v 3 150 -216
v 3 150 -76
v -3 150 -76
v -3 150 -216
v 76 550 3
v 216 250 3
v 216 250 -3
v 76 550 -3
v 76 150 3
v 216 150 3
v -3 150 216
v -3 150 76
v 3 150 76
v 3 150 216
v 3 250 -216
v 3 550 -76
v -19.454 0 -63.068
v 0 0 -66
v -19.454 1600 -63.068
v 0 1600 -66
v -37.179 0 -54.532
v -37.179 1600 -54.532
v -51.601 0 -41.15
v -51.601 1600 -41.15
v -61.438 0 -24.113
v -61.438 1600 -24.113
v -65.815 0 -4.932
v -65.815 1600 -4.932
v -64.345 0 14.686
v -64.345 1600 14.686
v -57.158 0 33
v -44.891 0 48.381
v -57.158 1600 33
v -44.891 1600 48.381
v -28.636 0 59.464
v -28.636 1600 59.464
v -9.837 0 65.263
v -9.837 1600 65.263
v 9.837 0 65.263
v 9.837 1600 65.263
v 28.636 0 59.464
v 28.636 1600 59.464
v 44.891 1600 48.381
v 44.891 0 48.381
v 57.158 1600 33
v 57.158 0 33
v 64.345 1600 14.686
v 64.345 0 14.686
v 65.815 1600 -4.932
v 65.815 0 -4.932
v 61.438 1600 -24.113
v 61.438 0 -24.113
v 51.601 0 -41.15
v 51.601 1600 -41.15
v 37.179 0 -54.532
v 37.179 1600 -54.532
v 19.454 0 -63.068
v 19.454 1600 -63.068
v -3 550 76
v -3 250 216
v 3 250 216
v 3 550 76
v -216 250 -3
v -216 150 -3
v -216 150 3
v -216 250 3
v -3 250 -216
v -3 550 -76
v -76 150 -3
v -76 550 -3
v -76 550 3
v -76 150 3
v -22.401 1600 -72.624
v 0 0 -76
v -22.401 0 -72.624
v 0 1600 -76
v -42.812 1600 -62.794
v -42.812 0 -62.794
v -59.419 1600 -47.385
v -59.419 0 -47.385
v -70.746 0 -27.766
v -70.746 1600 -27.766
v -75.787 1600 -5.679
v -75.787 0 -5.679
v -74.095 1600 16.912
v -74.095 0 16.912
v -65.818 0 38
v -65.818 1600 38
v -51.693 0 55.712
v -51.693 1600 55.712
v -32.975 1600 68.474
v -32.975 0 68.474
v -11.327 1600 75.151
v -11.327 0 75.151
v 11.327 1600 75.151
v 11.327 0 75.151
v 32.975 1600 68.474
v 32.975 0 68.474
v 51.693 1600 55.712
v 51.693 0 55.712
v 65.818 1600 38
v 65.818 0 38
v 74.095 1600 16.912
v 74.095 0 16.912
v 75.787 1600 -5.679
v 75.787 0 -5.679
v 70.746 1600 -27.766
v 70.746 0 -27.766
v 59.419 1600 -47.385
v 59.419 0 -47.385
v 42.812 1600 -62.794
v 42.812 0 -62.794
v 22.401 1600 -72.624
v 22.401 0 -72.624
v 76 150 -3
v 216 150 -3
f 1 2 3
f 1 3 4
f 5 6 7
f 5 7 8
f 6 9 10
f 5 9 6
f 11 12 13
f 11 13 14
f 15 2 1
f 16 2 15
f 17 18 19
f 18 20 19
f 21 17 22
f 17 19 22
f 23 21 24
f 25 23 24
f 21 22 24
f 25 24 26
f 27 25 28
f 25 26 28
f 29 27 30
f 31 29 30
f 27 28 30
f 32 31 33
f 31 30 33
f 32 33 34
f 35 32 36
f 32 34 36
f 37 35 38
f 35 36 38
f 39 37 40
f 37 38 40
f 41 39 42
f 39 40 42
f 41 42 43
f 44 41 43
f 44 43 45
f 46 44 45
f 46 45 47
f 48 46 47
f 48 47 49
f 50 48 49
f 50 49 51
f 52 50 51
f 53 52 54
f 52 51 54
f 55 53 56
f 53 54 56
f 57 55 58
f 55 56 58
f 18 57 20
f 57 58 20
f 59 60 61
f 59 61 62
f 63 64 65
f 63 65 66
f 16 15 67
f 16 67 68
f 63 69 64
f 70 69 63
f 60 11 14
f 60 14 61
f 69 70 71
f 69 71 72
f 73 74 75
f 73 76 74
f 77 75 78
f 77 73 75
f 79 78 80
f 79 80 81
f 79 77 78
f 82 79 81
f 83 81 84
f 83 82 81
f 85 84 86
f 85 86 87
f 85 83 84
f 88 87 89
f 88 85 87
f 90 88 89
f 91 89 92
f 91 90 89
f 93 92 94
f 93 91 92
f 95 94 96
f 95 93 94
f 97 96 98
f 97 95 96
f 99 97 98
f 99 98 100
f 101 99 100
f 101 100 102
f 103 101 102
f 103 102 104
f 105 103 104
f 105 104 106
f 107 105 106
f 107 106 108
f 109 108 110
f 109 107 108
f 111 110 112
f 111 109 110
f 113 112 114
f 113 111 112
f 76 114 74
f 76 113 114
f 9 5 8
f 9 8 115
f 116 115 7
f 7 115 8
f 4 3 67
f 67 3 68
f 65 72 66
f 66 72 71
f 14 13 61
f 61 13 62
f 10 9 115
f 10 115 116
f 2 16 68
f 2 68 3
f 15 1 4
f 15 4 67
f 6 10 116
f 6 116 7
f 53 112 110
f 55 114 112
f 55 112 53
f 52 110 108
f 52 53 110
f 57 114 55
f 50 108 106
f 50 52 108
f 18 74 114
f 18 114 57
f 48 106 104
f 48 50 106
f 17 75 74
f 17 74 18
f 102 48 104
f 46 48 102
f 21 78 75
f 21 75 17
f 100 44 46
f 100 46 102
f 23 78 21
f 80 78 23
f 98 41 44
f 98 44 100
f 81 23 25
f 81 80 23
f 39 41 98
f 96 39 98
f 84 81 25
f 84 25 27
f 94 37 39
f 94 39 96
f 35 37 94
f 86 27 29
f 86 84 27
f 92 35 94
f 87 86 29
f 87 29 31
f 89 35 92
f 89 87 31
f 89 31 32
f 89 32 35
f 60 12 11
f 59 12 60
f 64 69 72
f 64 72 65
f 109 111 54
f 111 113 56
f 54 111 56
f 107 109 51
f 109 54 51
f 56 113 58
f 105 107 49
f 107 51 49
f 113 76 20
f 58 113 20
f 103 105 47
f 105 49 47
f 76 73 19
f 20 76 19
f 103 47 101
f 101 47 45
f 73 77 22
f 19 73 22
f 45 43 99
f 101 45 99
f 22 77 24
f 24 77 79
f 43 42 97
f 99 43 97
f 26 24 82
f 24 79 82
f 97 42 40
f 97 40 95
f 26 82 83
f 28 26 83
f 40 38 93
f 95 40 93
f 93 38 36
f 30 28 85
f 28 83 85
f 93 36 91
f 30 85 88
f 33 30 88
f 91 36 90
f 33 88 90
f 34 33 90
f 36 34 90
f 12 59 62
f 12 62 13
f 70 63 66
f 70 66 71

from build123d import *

# Parameters (mm, degrees)
SKETCH1_W                = 10
SKETCH1_H                = 1600
BOSS_EXTRUDE1_DEPTH      = 3
BOSS_EXTRUDE1_DEPTH_BACK = 3
CIRPATTERN2_COUNT        = 4


with BuildPart() as part:
    # Sketch1 → Revolve1 (revolve)
    with BuildSketch(Plane.XY, mode=Mode.PRIVATE) as revolve1_sk:
        with Locations((71, 800)):
            Rectangle(SKETCH1_W, SKETCH1_H)
    revolve(revolve1_sk.sketch.rotate(Axis((0, 0, 0), (0, 1, 0)), 90), axis=Axis((0, 0, 0), (0, 1, 0)))


with BuildPart() as body_2:
    # Sketch2 → Boss-Extrude1 (new, two sides: drawn at the far end of the back side and taken through both)
    with BuildSketch(Plane.XY.offset(-BOSS_EXTRUDE1_DEPTH_BACK)):
        Polygon((-76, 550), (-76, 150), (-216, 150), (-216, 250), align=None)
    extrude(amount=BOSS_EXTRUDE1_DEPTH + BOSS_EXTRUDE1_DEPTH_BACK)


with BuildPart() as cirpattern2_1:
    # CirPattern2: pattern copy
    add(body_2.part.rotate(Axis((0, 0, 0), (0, 1, 0)), 1 * 360 / CIRPATTERN2_COUNT))


with BuildPart() as cirpattern2_2:
    # CirPattern2: pattern copy
    add(body_2.part.rotate(Axis((0, 0, 0), (0, 1, 0)), 2 * 360 / CIRPATTERN2_COUNT))


with BuildPart() as cirpattern2_3:
    # CirPattern2: pattern copy
    add(body_2.part.rotate(Axis((0, 0, 0), (0, 1, 0)), 3 * 360 / CIRPATTERN2_COUNT))


solid = Compound([part.part, body_2.part, cirpattern2_1.part, cirpattern2_2.part, cirpattern2_3.part])
